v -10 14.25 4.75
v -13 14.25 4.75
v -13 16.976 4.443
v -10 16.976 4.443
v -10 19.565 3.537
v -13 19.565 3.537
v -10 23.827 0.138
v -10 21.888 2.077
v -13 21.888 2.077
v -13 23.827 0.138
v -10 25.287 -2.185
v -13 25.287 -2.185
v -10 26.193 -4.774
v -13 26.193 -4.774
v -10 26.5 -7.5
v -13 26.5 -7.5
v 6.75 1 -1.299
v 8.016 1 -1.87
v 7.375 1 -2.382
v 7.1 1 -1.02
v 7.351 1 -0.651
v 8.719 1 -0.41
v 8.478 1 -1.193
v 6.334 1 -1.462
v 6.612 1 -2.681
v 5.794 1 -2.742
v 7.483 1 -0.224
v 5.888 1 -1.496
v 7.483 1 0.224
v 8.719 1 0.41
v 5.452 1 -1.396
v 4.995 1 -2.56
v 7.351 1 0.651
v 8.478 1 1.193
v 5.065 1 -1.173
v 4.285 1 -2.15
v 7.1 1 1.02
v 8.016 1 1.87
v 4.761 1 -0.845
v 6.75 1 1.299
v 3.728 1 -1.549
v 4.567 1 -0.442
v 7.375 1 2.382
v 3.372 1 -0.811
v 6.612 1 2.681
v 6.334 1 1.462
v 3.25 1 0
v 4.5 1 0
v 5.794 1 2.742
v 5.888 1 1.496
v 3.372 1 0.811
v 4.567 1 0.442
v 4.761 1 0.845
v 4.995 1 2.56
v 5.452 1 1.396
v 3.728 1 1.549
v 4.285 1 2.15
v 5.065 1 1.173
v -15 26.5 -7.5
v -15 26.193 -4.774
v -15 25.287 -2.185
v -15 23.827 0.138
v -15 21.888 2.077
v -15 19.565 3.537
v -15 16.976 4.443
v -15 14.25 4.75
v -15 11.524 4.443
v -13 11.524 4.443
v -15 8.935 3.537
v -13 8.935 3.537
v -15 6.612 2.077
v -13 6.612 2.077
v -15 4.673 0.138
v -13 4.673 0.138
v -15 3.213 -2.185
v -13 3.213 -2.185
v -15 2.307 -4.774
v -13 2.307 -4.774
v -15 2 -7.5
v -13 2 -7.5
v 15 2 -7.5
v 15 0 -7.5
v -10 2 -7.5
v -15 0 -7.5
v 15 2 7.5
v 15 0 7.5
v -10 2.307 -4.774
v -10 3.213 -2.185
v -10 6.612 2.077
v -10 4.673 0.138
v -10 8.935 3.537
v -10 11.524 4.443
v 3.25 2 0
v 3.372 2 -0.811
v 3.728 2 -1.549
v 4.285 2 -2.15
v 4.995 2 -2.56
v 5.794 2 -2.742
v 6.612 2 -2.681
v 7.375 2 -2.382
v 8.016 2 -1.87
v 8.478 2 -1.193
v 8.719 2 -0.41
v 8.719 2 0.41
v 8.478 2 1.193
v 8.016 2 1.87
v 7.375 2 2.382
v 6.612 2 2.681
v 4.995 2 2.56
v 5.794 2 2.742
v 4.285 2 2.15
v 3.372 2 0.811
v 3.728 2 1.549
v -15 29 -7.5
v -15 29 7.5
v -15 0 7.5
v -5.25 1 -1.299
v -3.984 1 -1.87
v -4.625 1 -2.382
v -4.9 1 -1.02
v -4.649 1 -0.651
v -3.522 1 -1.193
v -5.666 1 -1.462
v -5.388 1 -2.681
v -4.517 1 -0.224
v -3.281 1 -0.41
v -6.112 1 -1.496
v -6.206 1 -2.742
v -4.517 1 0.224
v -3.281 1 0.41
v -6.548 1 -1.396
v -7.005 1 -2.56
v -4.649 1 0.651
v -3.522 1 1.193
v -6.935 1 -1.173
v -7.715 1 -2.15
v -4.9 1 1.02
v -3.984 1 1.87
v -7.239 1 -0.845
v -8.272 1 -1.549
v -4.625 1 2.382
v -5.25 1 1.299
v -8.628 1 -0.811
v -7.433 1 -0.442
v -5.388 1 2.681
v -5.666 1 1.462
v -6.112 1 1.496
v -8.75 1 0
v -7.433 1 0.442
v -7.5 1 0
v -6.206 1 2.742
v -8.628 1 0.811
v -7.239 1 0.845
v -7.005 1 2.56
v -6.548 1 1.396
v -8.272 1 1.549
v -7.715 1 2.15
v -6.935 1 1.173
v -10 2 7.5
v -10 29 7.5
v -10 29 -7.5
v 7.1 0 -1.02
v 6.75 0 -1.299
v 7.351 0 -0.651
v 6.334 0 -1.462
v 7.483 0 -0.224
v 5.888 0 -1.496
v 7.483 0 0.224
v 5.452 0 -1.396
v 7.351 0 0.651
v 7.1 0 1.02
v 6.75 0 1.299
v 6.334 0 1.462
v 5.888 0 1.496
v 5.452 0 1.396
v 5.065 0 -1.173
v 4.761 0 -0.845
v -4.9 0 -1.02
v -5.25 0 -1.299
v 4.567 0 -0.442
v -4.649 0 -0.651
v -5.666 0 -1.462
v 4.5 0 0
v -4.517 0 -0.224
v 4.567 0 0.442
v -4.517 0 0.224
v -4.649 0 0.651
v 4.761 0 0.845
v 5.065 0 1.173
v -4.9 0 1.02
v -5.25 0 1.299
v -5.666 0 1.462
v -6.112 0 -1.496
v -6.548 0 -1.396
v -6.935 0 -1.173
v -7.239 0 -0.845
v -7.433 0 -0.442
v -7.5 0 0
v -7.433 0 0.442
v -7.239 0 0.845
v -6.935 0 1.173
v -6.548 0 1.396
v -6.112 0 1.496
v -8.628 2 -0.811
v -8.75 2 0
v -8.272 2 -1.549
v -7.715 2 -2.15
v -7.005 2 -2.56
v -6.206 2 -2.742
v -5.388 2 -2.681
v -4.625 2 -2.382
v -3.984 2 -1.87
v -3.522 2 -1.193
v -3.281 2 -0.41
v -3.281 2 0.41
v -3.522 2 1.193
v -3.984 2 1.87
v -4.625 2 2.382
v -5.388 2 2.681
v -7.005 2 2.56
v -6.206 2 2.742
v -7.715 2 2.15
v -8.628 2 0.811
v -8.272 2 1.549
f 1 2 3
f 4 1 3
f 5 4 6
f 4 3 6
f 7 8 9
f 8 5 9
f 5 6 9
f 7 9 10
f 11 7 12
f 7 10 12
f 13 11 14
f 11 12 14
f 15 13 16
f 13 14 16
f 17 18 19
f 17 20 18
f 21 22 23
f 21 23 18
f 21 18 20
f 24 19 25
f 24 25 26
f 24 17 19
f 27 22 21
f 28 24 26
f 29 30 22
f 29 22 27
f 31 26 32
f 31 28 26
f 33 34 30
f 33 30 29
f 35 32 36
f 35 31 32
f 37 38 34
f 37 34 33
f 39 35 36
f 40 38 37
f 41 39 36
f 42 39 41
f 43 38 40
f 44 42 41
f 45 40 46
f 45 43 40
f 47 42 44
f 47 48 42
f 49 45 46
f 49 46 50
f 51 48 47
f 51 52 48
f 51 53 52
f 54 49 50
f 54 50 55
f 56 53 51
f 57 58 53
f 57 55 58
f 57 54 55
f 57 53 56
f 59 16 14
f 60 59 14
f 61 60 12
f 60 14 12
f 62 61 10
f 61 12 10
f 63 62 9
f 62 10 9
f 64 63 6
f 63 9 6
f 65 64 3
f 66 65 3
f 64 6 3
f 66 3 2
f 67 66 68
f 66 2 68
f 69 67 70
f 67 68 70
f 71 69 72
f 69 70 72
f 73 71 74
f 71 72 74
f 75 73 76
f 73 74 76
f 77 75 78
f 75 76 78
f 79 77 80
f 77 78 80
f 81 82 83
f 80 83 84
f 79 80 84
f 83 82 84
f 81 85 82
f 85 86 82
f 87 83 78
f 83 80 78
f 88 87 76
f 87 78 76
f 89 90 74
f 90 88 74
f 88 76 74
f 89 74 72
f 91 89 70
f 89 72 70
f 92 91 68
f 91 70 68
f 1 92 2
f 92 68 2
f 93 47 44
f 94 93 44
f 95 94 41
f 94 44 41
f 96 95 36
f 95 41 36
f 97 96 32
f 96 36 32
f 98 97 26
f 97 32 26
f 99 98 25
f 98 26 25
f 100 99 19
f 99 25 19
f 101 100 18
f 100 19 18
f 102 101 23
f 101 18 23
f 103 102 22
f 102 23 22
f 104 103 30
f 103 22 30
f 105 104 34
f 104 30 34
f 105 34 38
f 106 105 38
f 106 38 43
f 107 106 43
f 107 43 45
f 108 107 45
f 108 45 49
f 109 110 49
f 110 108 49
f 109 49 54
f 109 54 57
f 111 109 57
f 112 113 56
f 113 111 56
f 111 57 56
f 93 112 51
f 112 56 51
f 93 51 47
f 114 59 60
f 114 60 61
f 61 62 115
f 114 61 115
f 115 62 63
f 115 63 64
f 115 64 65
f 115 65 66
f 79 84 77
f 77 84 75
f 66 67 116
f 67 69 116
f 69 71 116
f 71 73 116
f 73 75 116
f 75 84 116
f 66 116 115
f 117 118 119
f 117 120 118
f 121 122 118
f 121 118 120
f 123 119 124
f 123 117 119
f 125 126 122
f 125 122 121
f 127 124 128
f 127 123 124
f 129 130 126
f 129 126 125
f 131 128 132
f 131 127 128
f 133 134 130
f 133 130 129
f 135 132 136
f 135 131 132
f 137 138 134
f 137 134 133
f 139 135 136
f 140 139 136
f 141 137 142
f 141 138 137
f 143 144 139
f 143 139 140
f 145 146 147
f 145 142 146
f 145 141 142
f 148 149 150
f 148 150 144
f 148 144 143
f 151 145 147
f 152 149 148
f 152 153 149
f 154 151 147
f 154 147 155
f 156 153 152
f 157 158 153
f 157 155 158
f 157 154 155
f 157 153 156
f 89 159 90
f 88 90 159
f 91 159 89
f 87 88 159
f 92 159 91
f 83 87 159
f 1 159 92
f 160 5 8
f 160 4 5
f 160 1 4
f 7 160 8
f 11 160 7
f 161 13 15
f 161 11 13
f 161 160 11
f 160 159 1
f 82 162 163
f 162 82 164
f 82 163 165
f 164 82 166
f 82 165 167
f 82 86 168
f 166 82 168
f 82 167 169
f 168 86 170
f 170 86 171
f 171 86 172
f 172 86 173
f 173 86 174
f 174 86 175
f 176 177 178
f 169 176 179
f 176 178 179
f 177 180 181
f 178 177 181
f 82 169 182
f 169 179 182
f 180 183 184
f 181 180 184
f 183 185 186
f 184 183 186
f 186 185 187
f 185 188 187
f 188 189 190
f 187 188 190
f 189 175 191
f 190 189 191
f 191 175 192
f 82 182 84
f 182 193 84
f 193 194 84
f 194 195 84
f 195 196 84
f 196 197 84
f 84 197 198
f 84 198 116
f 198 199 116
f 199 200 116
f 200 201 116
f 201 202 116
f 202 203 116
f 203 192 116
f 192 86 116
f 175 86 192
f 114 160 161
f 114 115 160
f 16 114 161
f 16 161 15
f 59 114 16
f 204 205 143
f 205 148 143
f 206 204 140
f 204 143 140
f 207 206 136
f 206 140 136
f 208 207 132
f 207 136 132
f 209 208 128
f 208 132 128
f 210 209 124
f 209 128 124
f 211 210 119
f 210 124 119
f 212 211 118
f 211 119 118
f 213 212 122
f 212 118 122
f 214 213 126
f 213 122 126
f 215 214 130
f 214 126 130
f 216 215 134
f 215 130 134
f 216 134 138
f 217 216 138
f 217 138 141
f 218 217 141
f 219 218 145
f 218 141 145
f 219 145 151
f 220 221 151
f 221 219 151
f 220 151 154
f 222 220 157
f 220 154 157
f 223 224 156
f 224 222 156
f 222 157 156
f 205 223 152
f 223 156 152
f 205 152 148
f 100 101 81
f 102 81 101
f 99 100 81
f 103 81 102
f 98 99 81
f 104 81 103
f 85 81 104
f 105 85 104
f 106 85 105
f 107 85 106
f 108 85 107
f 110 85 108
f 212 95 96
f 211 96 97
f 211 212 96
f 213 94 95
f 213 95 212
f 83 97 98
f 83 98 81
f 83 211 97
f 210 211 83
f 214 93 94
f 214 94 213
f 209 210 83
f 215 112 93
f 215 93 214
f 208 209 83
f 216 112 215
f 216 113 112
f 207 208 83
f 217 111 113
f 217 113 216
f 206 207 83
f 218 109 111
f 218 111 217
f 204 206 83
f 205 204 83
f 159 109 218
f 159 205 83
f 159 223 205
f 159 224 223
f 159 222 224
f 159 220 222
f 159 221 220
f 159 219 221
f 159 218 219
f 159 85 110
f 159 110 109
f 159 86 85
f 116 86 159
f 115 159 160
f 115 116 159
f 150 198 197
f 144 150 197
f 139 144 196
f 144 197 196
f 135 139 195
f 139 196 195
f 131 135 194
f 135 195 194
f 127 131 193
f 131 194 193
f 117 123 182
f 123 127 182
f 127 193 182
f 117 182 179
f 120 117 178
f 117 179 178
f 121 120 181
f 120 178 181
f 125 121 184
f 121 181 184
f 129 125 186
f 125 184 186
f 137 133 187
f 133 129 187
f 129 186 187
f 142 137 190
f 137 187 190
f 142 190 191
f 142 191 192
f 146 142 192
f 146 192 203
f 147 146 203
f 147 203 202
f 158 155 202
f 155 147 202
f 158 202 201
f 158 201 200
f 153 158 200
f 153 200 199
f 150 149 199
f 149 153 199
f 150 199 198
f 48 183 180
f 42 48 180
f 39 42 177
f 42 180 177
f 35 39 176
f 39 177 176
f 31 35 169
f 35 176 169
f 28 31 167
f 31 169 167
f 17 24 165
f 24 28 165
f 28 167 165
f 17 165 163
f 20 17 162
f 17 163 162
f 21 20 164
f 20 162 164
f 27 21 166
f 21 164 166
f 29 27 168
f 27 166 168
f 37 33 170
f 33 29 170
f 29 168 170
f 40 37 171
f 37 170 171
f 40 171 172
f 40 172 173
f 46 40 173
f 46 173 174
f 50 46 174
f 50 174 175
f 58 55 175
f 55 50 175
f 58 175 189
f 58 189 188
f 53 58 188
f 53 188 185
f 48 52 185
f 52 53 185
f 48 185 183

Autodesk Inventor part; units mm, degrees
ref_plane "YZ Plane" through (0, 0, 0) normal (1, 0, 0) x (0, 1, 0)
ref_plane "XZ Plane" through (0, 0, 0) normal (0, 1, 0) x (-1, 0, 0)
ref_plane "XY Plane" through (0, 0, 0) normal (0, 0, 1) x (1, 0, 0)
sketch "Sketch1" plane through (0, 0, 0) normal (0, 1, 0) x (-1, 0, 0)
  line L0 (15, 7.5) -> (-15, 7.5)
  line L1 (-15, 7.5) -> (-15, -7.5)
  line L2 (-15, -7.5) -> (15, -7.5)
  line L3 (15, -7.5) -> (15, 7.5)
  line L4 (15, 7.5) -> (-15, -7.5) construction
  line L5 (-15, 7.5) -> (15, -7.5) construction
  line L6 (15, 7.5) -> (13, 7.5)
  line L7 (13, 7.5) -> (13, -7.5)
  line L8 (13, -7.5) -> (15, -7.5)
  line L9 (15, -7.5) -> (15, 7.5)
  circle A0 centre (6, 0) radius 1.5
  circle A1 centre (6, 0) radius 2.75
  line L10 (0, 7.5) -> (0, -7.5) construction
  circle A2 centre (-6, 0) radius 1.5
  circle A3 centre (-6, 0) radius 2.75
  point P0 (0, 0)
  dimension "d0" = 30
  dimension "d1" = 15
  dimension "d2" = 2
  dimension "d3" = 3
  dimension "d4" = 5.5
  dimension "d5" = 6
extrude "Extrusion1" add sketch "Sketch1" along normal blind 2 contours L7 L2 L1 L0
extrude "Extrusion2" add sketch "Sketch1" along normal blind 29 contours L3 L2 L7 L0
extrude "Extrusion3" add sketch "Sketch1" along normal blind 1 contours A1 | A3
sketch "Sketch2" plane through (-13, 2, -7.5) normal (1, 0, 0) x (0, 0, -1)
  line L0 (0, 0) -> (0, 27) projected
  line L1 (0, 0) -> (-15, 0) projected
  circle A0 centre (0, 12.25) radius 12.25
  point P0 (-7.5, -2)
  point P1 (0, 13.5)
  point P2 (0, 24.5)
  dimension "d16" = 24.5
  dimension "d17" = 12.25
extrude "Extrusion4" cut sketch "Sketch2" against normal blind 2 contours A0 L0 picked at (-3.685, 9.0749)
sketch "Sketch3" plane through (-13, 2, 7.5) normal (1, 0, 0) x (0, 0, -1)
  line L0 (0, 27) -> (15, 27) projected
  line L1 (15, 27) -> (0, 27)
  line L2 (0, 0) -> (0, 27) projected
  line L3 (0, 27) -> (0, 0)
  line L4 (0, 0) -> (15, 0)
  arc A0 (15, 24.5) -> (15, 0) centre (15, 12.25) ccw projected
  arc A1 (2.75, 12.25) -> (15, 24.5) centre (15, 12.25) ccw
  line L5 (15, 27) -> (15, 24.5)
  line L6 (15, 0) -> (15, 24.5)
  point P0 (7.5, -2)
extrude "Extrusion5" add sketch "Sketch3" along normal blind 3 contours L0 L5 A0 L4 L2
properties part number "Bracket Motor JGA Kiri_3DPrint"
